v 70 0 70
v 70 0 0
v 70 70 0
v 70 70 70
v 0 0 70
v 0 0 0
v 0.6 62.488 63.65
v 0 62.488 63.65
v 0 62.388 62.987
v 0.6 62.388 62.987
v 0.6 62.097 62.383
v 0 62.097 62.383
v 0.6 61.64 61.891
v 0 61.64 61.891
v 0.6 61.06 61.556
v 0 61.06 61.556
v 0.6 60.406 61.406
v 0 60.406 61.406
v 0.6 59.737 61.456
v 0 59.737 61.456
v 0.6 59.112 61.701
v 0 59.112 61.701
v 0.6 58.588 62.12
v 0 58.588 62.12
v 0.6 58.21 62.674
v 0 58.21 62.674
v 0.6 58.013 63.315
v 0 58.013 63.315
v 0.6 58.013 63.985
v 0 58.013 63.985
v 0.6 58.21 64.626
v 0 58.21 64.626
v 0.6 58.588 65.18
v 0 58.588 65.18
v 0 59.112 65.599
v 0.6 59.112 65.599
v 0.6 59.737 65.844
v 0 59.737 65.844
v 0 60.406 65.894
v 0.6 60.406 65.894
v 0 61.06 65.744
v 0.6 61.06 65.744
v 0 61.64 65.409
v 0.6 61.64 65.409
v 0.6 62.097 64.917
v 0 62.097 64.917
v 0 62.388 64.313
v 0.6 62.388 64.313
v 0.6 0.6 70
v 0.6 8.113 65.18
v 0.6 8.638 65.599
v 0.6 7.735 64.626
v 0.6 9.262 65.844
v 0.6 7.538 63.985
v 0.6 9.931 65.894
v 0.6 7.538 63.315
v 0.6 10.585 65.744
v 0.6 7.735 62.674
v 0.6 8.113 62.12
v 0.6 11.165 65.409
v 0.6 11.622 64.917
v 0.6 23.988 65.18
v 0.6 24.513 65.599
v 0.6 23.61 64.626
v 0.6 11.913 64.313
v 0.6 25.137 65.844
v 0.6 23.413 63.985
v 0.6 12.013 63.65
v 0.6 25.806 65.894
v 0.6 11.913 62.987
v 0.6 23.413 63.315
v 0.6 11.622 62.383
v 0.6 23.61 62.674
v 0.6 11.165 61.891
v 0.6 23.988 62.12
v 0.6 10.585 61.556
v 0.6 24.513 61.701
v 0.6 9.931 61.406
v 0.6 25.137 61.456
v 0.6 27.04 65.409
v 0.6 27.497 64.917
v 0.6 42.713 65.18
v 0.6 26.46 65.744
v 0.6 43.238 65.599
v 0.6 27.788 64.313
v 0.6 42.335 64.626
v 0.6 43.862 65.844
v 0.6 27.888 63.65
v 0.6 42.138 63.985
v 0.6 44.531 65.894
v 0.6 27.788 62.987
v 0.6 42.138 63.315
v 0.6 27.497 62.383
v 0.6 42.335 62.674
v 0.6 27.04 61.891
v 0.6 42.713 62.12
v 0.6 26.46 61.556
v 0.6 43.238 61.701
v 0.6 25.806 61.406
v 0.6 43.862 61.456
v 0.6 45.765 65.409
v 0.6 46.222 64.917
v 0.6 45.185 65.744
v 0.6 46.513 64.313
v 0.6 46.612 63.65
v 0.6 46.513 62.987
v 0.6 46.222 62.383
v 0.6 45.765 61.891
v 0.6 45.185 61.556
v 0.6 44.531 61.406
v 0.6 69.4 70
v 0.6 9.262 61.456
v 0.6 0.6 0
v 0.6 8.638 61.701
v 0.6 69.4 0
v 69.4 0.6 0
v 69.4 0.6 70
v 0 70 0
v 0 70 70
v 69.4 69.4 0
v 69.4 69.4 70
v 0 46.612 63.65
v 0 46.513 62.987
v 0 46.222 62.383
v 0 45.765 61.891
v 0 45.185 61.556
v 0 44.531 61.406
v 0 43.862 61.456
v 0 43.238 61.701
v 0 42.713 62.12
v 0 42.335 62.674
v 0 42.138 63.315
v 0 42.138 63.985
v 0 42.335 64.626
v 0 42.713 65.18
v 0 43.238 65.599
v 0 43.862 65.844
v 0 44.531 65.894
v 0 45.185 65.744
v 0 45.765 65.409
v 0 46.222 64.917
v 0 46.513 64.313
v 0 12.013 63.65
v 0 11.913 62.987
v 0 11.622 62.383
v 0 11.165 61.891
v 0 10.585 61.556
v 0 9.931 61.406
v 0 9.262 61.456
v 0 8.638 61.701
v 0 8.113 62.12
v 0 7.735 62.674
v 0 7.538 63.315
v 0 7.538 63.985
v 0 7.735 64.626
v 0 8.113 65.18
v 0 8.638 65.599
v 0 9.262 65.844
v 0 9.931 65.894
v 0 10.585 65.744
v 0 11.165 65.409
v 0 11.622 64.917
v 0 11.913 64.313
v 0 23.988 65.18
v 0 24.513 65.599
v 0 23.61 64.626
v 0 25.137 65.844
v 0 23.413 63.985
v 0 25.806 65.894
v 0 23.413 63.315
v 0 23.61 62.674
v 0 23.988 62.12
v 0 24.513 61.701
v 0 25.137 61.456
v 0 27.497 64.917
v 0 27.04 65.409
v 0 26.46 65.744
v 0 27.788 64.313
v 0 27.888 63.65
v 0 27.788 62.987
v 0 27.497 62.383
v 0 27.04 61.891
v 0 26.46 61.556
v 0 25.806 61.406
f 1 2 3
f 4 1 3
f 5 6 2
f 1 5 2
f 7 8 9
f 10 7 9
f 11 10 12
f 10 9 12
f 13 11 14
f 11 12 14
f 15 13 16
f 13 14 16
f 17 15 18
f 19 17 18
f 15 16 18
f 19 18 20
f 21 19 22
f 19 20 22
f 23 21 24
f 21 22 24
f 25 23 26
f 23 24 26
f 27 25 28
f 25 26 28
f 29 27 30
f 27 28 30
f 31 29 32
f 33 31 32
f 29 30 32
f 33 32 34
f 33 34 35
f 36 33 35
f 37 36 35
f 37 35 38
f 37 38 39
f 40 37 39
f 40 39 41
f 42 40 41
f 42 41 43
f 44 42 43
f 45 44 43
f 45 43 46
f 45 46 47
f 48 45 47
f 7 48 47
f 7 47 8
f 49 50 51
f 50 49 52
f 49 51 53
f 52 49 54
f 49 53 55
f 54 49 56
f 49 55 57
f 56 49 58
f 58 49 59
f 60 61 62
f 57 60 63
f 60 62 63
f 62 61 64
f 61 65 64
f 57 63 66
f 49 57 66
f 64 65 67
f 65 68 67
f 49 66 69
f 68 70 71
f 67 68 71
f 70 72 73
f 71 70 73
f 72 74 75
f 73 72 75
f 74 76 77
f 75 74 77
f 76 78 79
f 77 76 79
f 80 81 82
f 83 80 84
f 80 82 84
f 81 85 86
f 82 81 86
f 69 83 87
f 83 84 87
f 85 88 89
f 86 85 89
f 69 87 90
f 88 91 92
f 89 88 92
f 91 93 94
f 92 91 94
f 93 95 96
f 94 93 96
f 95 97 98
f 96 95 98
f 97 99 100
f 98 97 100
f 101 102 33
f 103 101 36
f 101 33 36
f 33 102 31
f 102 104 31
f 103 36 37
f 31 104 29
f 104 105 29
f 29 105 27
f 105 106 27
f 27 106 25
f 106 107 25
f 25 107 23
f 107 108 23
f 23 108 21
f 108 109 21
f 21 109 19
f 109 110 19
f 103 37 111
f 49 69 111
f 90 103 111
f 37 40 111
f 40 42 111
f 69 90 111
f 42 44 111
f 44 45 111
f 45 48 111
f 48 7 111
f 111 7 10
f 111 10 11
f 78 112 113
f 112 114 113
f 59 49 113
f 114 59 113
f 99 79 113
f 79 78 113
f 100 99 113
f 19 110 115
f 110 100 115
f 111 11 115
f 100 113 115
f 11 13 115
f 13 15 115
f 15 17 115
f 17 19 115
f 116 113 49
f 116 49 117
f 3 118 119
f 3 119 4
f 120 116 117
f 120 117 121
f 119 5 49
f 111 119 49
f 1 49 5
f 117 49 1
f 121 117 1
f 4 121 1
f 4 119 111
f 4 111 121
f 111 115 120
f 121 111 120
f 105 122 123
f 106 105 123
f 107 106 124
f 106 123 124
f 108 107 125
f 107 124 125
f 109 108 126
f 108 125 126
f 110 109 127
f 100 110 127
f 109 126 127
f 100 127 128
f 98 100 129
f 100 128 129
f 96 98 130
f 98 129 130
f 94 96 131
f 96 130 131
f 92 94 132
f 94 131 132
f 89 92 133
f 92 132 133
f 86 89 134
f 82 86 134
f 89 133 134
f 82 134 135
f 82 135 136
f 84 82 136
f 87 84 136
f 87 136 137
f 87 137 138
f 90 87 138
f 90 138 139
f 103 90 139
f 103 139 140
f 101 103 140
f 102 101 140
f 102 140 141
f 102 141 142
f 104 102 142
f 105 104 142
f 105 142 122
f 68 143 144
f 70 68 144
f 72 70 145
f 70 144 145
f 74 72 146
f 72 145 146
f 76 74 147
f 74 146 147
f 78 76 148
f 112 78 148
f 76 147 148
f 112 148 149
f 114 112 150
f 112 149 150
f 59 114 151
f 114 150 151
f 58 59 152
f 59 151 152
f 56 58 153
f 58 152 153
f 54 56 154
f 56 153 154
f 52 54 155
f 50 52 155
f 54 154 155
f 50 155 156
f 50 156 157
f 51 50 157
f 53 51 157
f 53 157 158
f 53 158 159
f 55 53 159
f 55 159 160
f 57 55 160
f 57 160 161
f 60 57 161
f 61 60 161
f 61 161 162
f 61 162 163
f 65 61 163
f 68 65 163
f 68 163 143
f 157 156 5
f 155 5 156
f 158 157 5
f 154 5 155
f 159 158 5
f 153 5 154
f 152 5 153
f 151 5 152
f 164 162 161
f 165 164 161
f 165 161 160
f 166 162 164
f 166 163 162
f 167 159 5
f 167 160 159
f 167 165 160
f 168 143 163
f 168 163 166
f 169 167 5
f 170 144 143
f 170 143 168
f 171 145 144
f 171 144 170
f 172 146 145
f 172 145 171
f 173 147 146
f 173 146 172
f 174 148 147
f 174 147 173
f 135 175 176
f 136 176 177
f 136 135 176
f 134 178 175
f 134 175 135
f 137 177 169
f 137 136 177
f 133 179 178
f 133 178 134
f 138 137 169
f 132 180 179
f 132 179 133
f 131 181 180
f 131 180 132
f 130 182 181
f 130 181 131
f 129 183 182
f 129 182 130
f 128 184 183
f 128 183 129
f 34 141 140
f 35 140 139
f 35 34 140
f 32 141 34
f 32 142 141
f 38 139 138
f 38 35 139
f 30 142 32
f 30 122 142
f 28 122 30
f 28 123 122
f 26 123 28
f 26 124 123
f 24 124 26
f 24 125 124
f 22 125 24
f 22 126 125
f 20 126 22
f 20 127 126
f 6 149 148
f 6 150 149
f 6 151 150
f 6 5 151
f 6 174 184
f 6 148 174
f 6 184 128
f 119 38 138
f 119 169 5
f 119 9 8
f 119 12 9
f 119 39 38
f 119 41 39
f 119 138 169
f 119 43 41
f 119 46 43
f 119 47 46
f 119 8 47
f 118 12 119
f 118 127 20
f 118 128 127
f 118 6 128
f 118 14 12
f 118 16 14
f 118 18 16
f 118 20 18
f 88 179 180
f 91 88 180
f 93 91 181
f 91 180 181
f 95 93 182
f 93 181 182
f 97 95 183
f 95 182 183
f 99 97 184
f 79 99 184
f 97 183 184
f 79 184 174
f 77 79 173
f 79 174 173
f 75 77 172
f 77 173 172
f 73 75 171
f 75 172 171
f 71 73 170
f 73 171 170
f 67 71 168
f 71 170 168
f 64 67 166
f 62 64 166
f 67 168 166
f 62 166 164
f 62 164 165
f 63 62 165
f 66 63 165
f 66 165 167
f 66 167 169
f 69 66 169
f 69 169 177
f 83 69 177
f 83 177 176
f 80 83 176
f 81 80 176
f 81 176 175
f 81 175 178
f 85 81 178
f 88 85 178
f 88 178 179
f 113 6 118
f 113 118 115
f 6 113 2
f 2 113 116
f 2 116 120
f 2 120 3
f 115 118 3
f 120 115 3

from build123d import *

# Parameters (mm, degrees)
CROQUIS1_W                        = 70
CROQUIS1_H                        = 70
SALIENTE_EXTRUIR1_DEPTH           = 70
VACIADO1_T                        = -0.6
TALADRO_DE_MARGEN_PARA_M41_REACH  = 173.7
TALADRO_DE_MARGEN_PARA_M41_BORE_R = 2.25


with BuildPart() as part:
    # Croquis1 → Saliente-Extruir1 (new body)
    with BuildSketch(Plane.XY):
        with Locations((35, 35)):
            Rectangle(CROQUIS1_W, CROQUIS1_H)
    extrude(amount=SALIENTE_EXTRUIR1_DEPTH)

    # Vaciado1
    vaciado1_openings = [part.faces().sort_by_distance(p)[0] for p in [
        (35, 35, 70),
        (35, 35, 0),
    ]]
    offset(amount=VACIADO1_T, openings=vaciado1_openings, kind=Kind.INTERSECTION)

    # Taladro de margen para M41 bore → Taladro de margen para M41 (cut, up to next)
    with BuildSketch(Plane(origin=(-1, -81.2, 39.730415546), x_dir=(0, 1, 0), z_dir=(-1, 0, 0)), mode=Mode.PRIVATE) as taladro_de_margen_para_m41_sk1:
        with Locations((90.9625, -23.919584454)):
            Circle(TALADRO_DE_MARGEN_PARA_M41_BORE_R)
    taladro_de_margen_para_m41_tool1 = extrude(taladro_de_margen_para_m41_sk1.sketch, amount=-TALADRO_DE_MARGEN_PARA_M41_REACH, mode=Mode.PRIVATE) & part.part
    # Taladro de margen para M41 bore → Taladro de margen para M41 (cut, up to next)
    with BuildSketch(Plane(origin=(-1, -81.2, 39.730415546), x_dir=(0, 1, 0), z_dir=(-1, 0, 0)), mode=Mode.PRIVATE) as taladro_de_margen_para_m41_sk2:
        with Locations((106.8375, -23.919584454)):
            Circle(TALADRO_DE_MARGEN_PARA_M41_BORE_R)
    taladro_de_margen_para_m41_tool2 = extrude(taladro_de_margen_para_m41_sk2.sketch, amount=-TALADRO_DE_MARGEN_PARA_M41_REACH, mode=Mode.PRIVATE) & part.part
    # Taladro de margen para M41 bore → Taladro de margen para M41 (cut, up to next)
    with BuildSketch(Plane(origin=(-1, -81.2, 39.730415546), x_dir=(0, 1, 0), z_dir=(-1, 0, 0)), mode=Mode.PRIVATE) as taladro_de_margen_para_m41_sk3:
        with Locations((125.5625, -23.919584454)):
            Circle(TALADRO_DE_MARGEN_PARA_M41_BORE_R)
    taladro_de_margen_para_m41_tool3 = extrude(taladro_de_margen_para_m41_sk3.sketch, amount=-TALADRO_DE_MARGEN_PARA_M41_REACH, mode=Mode.PRIVATE) & part.part
    # Taladro de margen para M41 bore → Taladro de margen para M41 (cut, up to next)
    with BuildSketch(Plane(origin=(-1, -81.2, 39.730415546), x_dir=(0, 1, 0), z_dir=(-1, 0, 0)), mode=Mode.PRIVATE) as taladro_de_margen_para_m41_sk4:
        with Locations((141.4375, -23.919584454)):
            Circle(TALADRO_DE_MARGEN_PARA_M41_BORE_R)
    taladro_de_margen_para_m41_tool4 = extrude(taladro_de_margen_para_m41_sk4.sketch, amount=-TALADRO_DE_MARGEN_PARA_M41_REACH, mode=Mode.PRIVATE) & part.part
    add(taladro_de_margen_para_m41_tool1.solids().sort_by_distance((-1, 9.7625, 63.65))[0], mode=Mode.SUBTRACT)
    add(taladro_de_margen_para_m41_tool2.solids().sort_by_distance((-1, 25.6375, 63.65))[0], mode=Mode.SUBTRACT)
    add(taladro_de_margen_para_m41_tool3.solids().sort_by_distance((-1, 44.3625, 63.65))[0], mode=Mode.SUBTRACT)
    add(taladro_de_margen_para_m41_tool4.solids().sort_by_distance((-1, 60.2375, 63.65))[0], mode=Mode.SUBTRACT)


solid = part.part
